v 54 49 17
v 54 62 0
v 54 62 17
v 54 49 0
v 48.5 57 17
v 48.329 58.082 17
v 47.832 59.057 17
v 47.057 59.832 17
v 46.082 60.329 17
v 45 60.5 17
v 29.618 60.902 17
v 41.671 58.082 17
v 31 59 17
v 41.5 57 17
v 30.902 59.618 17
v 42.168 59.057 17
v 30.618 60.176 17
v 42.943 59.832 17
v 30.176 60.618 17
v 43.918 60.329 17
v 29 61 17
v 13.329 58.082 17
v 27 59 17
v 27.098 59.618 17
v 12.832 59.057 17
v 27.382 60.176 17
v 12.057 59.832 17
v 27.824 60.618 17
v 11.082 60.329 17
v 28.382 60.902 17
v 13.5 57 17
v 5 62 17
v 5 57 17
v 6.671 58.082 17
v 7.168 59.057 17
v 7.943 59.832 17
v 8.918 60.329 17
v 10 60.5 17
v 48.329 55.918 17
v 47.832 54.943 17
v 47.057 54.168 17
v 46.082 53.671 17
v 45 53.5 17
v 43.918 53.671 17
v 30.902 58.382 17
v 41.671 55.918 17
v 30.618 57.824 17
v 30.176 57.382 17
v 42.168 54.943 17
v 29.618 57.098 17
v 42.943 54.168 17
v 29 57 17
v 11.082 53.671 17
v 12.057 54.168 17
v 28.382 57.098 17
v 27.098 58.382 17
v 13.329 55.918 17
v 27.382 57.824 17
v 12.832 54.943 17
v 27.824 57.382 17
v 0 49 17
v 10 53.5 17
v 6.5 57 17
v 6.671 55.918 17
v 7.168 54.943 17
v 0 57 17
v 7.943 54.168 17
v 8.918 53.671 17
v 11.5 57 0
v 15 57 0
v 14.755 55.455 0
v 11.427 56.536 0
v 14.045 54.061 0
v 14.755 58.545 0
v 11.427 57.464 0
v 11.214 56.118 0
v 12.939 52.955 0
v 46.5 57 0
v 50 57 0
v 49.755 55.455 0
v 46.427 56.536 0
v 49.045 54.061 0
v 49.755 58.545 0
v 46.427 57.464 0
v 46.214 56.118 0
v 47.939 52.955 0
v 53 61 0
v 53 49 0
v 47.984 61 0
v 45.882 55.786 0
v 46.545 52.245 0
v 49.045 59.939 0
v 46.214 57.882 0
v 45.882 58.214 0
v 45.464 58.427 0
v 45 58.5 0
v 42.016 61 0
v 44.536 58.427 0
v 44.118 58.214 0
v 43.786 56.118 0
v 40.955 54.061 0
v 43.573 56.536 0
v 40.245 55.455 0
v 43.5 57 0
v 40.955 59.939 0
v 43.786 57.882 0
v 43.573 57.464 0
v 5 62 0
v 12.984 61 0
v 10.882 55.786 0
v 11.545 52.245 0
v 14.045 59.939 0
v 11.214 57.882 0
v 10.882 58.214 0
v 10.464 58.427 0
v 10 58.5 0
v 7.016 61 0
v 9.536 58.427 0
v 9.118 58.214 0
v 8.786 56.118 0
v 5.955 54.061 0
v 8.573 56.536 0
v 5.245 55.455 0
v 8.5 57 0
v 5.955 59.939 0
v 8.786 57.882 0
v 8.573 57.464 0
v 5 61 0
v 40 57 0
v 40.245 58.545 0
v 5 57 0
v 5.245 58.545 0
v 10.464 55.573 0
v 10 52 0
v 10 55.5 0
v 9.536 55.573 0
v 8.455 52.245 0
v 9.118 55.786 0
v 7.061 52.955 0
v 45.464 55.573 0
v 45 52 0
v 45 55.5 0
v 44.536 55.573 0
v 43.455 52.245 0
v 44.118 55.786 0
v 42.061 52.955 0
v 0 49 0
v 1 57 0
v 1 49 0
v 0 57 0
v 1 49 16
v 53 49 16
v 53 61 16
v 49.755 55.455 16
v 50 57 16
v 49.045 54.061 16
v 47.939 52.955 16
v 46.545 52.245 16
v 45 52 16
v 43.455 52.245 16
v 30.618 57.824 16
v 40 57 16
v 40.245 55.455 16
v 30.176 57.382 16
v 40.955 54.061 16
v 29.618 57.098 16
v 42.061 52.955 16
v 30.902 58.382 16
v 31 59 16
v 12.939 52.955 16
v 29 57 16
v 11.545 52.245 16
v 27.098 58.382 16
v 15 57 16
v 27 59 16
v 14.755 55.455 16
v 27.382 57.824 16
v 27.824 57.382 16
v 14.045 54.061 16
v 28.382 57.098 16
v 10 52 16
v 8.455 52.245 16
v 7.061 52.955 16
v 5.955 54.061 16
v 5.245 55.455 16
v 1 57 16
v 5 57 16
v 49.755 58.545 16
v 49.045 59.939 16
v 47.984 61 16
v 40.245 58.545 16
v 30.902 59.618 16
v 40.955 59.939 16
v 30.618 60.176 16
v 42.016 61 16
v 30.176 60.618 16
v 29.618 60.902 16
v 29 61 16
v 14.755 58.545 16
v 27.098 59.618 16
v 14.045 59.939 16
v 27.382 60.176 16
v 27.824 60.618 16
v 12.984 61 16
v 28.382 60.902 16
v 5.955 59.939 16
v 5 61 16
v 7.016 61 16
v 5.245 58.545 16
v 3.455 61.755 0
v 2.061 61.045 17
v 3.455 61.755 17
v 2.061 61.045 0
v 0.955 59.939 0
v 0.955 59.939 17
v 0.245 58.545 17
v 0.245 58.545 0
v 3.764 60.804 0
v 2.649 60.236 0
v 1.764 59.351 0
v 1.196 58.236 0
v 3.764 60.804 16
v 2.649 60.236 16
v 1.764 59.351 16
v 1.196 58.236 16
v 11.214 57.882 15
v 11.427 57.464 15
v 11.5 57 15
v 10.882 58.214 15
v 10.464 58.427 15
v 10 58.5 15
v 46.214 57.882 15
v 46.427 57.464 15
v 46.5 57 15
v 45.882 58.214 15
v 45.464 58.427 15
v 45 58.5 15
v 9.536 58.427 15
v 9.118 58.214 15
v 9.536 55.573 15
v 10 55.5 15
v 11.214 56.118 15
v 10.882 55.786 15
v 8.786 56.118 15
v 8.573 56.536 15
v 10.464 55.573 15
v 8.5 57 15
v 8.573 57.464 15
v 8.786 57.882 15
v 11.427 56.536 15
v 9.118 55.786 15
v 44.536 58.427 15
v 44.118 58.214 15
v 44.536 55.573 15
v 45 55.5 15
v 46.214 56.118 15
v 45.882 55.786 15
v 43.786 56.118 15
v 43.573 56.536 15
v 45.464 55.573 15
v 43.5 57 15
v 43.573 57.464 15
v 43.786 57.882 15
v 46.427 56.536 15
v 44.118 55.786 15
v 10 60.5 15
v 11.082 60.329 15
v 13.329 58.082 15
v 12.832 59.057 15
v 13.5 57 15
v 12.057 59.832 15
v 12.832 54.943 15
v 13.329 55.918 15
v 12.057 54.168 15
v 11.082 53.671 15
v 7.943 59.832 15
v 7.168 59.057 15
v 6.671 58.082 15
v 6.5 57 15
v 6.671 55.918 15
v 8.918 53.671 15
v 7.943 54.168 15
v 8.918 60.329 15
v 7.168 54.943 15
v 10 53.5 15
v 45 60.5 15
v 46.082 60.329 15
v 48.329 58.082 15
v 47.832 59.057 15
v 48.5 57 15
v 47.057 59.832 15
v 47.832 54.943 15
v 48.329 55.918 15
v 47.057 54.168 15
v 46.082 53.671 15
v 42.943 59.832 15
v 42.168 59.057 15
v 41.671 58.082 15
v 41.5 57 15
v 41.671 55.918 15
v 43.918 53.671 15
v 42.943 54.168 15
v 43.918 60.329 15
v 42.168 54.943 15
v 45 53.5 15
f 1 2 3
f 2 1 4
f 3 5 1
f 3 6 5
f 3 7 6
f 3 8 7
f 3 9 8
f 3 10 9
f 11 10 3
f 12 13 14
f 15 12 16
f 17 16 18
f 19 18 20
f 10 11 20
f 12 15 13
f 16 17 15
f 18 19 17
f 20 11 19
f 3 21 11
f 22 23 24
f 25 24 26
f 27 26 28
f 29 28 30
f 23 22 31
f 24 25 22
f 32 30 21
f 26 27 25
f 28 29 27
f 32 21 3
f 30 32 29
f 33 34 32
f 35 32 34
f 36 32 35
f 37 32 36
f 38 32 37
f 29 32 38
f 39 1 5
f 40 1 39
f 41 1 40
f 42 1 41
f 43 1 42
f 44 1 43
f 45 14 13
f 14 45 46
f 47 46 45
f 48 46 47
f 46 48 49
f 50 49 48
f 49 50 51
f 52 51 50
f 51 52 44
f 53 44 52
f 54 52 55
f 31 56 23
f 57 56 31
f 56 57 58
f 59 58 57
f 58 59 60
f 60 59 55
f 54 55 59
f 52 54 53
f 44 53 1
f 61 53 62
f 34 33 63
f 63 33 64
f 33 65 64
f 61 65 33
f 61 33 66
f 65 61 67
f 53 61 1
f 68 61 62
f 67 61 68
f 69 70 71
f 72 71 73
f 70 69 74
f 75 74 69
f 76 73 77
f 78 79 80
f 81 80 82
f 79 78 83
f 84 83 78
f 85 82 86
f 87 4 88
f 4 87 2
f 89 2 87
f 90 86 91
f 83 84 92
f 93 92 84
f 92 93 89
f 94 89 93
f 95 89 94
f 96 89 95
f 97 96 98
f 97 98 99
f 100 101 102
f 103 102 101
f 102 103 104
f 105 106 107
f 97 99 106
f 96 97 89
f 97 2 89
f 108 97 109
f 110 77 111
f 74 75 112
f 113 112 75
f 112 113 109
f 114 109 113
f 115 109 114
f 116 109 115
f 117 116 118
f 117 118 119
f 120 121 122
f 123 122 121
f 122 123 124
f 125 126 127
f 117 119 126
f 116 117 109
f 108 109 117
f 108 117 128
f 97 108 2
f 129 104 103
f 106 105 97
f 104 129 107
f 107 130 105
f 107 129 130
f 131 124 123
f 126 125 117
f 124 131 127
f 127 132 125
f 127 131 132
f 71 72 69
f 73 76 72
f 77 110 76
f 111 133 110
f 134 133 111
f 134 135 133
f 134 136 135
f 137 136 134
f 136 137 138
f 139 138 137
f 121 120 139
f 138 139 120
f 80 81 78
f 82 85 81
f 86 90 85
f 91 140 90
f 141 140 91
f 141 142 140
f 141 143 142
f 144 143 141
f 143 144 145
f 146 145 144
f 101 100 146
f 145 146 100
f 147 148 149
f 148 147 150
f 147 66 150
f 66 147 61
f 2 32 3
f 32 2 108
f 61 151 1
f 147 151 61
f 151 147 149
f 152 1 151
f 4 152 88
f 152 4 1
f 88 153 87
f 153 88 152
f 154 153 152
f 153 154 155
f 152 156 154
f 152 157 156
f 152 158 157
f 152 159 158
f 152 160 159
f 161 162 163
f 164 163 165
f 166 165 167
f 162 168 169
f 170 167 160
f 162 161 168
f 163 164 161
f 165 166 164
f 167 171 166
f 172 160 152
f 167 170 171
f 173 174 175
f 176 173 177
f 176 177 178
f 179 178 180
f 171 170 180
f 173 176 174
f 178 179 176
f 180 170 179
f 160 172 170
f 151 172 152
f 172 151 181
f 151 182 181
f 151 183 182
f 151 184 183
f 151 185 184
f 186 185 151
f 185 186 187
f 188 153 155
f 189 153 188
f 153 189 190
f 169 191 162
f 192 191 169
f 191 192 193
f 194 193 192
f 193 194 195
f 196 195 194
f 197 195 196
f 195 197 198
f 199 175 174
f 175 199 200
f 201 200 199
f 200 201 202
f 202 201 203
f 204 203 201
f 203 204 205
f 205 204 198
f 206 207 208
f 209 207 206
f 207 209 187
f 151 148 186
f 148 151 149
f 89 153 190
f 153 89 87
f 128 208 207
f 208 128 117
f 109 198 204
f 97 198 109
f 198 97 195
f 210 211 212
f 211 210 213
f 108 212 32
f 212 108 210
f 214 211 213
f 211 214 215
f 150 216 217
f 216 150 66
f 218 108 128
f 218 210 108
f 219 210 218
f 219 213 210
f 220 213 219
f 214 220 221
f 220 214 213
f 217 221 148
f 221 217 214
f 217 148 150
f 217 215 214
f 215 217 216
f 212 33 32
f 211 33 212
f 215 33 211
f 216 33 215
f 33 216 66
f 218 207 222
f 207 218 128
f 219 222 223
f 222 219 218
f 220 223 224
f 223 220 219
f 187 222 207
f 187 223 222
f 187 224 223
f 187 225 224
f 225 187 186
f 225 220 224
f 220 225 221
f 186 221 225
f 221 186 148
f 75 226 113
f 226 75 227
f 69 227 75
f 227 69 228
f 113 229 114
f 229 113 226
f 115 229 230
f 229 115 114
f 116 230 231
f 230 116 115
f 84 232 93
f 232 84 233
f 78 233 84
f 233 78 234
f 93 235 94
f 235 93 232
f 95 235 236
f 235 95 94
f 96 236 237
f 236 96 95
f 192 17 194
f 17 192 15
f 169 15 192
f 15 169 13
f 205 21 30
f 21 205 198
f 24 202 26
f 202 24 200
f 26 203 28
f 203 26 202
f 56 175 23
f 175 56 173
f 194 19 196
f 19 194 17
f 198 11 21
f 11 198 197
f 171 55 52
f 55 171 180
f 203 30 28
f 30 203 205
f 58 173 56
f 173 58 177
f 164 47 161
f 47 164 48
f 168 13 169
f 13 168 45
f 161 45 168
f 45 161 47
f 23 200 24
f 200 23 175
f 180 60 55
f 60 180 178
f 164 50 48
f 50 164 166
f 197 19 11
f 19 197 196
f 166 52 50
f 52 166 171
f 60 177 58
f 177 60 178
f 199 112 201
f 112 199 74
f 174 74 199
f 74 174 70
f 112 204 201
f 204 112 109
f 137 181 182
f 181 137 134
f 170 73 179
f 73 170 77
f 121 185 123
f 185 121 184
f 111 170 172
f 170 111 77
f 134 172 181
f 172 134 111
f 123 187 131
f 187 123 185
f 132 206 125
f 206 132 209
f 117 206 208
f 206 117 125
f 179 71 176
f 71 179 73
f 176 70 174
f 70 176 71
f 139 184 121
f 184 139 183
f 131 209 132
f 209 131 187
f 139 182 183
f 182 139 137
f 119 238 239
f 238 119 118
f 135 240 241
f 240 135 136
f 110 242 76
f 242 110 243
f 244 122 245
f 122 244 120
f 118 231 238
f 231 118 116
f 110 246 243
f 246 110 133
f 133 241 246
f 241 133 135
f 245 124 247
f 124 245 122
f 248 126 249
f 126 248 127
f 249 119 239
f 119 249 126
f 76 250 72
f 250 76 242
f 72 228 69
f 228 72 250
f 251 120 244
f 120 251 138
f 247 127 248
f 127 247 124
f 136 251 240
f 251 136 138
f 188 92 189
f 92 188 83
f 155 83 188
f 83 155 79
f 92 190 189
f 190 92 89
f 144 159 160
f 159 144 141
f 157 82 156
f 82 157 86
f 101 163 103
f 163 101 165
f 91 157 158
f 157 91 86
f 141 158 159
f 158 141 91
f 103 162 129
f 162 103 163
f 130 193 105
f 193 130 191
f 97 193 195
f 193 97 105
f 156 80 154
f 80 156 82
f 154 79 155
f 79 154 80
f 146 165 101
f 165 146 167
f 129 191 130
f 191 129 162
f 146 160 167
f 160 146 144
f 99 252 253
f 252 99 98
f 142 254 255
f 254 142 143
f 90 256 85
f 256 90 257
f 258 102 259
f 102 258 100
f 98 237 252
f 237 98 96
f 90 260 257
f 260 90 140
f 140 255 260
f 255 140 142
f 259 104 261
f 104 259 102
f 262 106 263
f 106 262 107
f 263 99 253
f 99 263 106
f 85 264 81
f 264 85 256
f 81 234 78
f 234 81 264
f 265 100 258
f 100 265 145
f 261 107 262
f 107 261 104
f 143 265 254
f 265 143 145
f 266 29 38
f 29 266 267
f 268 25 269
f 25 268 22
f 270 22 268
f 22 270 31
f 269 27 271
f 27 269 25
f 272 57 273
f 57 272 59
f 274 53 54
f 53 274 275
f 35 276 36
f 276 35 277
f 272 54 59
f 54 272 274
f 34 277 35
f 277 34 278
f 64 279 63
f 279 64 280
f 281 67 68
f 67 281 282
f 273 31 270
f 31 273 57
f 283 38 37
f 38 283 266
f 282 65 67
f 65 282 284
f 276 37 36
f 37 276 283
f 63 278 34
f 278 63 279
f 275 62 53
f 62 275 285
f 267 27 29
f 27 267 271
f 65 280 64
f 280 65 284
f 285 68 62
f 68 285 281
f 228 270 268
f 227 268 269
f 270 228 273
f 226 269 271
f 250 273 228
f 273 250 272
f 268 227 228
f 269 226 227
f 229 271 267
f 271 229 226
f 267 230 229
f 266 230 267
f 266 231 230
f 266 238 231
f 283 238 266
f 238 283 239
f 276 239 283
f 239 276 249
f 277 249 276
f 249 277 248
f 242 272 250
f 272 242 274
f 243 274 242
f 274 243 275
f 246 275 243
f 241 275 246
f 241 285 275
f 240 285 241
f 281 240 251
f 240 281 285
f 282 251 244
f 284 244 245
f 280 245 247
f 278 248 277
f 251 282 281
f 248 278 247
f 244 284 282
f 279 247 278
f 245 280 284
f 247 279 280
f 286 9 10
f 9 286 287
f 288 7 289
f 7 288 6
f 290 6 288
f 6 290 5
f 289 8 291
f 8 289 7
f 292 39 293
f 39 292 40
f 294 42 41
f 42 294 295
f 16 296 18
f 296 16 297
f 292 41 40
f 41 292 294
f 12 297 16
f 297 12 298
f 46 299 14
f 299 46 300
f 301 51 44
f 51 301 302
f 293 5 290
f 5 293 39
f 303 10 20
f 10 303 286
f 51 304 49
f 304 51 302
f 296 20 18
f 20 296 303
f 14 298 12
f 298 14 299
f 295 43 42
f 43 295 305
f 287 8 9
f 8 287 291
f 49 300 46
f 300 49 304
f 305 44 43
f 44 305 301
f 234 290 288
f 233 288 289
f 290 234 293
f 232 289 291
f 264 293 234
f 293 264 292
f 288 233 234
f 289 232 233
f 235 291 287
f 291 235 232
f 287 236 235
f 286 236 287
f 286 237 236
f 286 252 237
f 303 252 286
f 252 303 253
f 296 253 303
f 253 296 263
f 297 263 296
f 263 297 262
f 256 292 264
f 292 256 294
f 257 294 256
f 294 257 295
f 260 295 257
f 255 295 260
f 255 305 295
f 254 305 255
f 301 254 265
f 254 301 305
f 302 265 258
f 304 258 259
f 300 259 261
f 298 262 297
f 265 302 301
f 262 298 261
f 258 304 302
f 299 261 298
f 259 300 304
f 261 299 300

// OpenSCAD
module m3(){
    circle(d=3,$fn=20);
}

module m3_3d(height){
    cylinder(h=height,d=3,$fn=20);
}

module m4_3d(height){
    cylinder(h=height,d=4,$fn=20);
}

module m3head_3d(){
    cylinder(h=3,d=7,$fn=20);
}

module m2_3d(height){
    cylinder(h=20,d=2,$fn=20);
}

module m3_mount(height){
    difference(){
        cylinder( h=height,r=5 ,$fn=20);
        cylinder( h=height,r=1.5,$fn=20 );
    }
}

module r_courner_3d(height,r_outer,width){
    difference(){
        cylinder( h=height,r=r_outer , $fn=20);
        cylinder( h= height-width , r = r_outer - width  , $fn=20);
        translate([-r_outer,0,0]) cube([r_outer,r_outer,height]);
        translate([-r_outer,-r_outer,0]) cube([r_outer*2,r_outer,height]);
    }
    

}

base_width = 94;
base_height = 62;
courner_r = 5;

module bottom_base(){
    union(){
        difference(){
            // base
            square([base_width,base_height]);
            
            // R
            translate([0,base_height- courner_r]) square([courner_r,courner_r]);
            translate([base_width-courner_r,base_height- courner_r]) square([courner_r,courner_r]);
        }
        translate([courner_r,base_height- courner_r])  circle(r=courner_r,$fn=20);
        translate([base_width-courner_r,base_height- courner_r])  circle(r=courner_r,$fn=20);
    }
}

module bottom(){
    difference(){
        // base
        bottom_base();
        
        // pcb mount hole
        translate([80,43]) m3();
        translate([80,43-1.5]) square([9,3]);
        translate([89,43]) m3();
        
        // MHZ
        translate([69,52]) m3();
        translate([84,52]) m3();
        translate([69,2]) square([10,2]);
       
        // m5stack
        translate([5,5]) m3();
        translate([49,5]) m3();

        // LED
        translate([45,5+37+16]) m3();
        translate([10,5+37+16]) m3();

    }
}

//bottom();

mhz_case_height = 17;
module mhz_case_base(){
    union(){
        difference(){
            cube([37+2,25+37,mhz_case_height]);
            translate([37+2 -courner_r,25+37-courner_r,0]) cube([courner_r,courner_r,mhz_case_height]);
            translate([0,4,0]) cube([37,56,mhz_case_height-1]);
        }
        translate([37+2 -courner_r,25+37-courner_r,0]) r_courner_3d(mhz_case_height,courner_r,2);
    }
}

module mhz_case(){
    difference(){
    union(){
        difference(){
            mhz_case_base();
            
            translate([14,52,0]) m3_3d(mhz_case_height);
            translate([29,52,0]) m3_3d(mhz_case_height);
            
            for ( y = [12 : 10:47] ){
                translate([10,y,0]) m2_3d(mhz_case_height);
                translate([25,y,0]) m2_3d(mhz_case_height);
            }

            for( x = [0:10:30] ){
                translate([x,4,mhz_case_height-2]) cube([5,2,3]);
            }

            for( y = [8:10:48] ){
                translate([37,y,3]) cube([2,1,mhz_case_height-5]);
            }
        }
        translate([14,52,0]) m3_mount(mhz_case_height);
        translate([29,52,0]) m3_mount(mhz_case_height);
        translate([0,53,0]) cube([2,8,mhz_case_height]);
        translate([14.1,2.1,-2]) cube([9.8,1.8,2.5]);
    }
        translate([14,5+37+10,mhz_case_height-2]) m3head_3d();
        translate([29,5+37+10,mhz_case_height-2]) m3head_3d();
    }
}
//color([0,0,0]) translate([55,0]) mhz_case();

led_case_height = mhz_case_height;
module led_case_base(){
    union(){
        difference(){
            cube([54,13,led_case_height]);
            translate([1,0,0]) cube([52,12,led_case_height-1]);
            translate([0,13-courner_r,0]) cube([courner_r,courner_r,led_case_height]);
        }
        translate([courner_r,13-courner_r,0]) 
            rotate( [0,0,90] )
            
            r_courner_3d( led_case_height , courner_r , 1);
    }
}

module led_case(){
    difference(){
        union(){
            difference(){
                led_case_base();
                
                translate([10,8,0]) m3_3d(led_case_height);
                translate([45,8,0]) m3_3d(led_case_height);
            
                translate([29,10,0]) m4_3d(led_case_height);
            }
            translate([10,8,0]) m3_mount(led_case_height);
            translate([45,8,0]) m3_mount(led_case_height);
        }
        
        translate([10,8,led_case_height-2]) m3head_3d();
        translate([45,8,led_case_height-2]) m3head_3d();
    }
}
color([0.5,0.5,0.5]) translate([0,49])led_case();
